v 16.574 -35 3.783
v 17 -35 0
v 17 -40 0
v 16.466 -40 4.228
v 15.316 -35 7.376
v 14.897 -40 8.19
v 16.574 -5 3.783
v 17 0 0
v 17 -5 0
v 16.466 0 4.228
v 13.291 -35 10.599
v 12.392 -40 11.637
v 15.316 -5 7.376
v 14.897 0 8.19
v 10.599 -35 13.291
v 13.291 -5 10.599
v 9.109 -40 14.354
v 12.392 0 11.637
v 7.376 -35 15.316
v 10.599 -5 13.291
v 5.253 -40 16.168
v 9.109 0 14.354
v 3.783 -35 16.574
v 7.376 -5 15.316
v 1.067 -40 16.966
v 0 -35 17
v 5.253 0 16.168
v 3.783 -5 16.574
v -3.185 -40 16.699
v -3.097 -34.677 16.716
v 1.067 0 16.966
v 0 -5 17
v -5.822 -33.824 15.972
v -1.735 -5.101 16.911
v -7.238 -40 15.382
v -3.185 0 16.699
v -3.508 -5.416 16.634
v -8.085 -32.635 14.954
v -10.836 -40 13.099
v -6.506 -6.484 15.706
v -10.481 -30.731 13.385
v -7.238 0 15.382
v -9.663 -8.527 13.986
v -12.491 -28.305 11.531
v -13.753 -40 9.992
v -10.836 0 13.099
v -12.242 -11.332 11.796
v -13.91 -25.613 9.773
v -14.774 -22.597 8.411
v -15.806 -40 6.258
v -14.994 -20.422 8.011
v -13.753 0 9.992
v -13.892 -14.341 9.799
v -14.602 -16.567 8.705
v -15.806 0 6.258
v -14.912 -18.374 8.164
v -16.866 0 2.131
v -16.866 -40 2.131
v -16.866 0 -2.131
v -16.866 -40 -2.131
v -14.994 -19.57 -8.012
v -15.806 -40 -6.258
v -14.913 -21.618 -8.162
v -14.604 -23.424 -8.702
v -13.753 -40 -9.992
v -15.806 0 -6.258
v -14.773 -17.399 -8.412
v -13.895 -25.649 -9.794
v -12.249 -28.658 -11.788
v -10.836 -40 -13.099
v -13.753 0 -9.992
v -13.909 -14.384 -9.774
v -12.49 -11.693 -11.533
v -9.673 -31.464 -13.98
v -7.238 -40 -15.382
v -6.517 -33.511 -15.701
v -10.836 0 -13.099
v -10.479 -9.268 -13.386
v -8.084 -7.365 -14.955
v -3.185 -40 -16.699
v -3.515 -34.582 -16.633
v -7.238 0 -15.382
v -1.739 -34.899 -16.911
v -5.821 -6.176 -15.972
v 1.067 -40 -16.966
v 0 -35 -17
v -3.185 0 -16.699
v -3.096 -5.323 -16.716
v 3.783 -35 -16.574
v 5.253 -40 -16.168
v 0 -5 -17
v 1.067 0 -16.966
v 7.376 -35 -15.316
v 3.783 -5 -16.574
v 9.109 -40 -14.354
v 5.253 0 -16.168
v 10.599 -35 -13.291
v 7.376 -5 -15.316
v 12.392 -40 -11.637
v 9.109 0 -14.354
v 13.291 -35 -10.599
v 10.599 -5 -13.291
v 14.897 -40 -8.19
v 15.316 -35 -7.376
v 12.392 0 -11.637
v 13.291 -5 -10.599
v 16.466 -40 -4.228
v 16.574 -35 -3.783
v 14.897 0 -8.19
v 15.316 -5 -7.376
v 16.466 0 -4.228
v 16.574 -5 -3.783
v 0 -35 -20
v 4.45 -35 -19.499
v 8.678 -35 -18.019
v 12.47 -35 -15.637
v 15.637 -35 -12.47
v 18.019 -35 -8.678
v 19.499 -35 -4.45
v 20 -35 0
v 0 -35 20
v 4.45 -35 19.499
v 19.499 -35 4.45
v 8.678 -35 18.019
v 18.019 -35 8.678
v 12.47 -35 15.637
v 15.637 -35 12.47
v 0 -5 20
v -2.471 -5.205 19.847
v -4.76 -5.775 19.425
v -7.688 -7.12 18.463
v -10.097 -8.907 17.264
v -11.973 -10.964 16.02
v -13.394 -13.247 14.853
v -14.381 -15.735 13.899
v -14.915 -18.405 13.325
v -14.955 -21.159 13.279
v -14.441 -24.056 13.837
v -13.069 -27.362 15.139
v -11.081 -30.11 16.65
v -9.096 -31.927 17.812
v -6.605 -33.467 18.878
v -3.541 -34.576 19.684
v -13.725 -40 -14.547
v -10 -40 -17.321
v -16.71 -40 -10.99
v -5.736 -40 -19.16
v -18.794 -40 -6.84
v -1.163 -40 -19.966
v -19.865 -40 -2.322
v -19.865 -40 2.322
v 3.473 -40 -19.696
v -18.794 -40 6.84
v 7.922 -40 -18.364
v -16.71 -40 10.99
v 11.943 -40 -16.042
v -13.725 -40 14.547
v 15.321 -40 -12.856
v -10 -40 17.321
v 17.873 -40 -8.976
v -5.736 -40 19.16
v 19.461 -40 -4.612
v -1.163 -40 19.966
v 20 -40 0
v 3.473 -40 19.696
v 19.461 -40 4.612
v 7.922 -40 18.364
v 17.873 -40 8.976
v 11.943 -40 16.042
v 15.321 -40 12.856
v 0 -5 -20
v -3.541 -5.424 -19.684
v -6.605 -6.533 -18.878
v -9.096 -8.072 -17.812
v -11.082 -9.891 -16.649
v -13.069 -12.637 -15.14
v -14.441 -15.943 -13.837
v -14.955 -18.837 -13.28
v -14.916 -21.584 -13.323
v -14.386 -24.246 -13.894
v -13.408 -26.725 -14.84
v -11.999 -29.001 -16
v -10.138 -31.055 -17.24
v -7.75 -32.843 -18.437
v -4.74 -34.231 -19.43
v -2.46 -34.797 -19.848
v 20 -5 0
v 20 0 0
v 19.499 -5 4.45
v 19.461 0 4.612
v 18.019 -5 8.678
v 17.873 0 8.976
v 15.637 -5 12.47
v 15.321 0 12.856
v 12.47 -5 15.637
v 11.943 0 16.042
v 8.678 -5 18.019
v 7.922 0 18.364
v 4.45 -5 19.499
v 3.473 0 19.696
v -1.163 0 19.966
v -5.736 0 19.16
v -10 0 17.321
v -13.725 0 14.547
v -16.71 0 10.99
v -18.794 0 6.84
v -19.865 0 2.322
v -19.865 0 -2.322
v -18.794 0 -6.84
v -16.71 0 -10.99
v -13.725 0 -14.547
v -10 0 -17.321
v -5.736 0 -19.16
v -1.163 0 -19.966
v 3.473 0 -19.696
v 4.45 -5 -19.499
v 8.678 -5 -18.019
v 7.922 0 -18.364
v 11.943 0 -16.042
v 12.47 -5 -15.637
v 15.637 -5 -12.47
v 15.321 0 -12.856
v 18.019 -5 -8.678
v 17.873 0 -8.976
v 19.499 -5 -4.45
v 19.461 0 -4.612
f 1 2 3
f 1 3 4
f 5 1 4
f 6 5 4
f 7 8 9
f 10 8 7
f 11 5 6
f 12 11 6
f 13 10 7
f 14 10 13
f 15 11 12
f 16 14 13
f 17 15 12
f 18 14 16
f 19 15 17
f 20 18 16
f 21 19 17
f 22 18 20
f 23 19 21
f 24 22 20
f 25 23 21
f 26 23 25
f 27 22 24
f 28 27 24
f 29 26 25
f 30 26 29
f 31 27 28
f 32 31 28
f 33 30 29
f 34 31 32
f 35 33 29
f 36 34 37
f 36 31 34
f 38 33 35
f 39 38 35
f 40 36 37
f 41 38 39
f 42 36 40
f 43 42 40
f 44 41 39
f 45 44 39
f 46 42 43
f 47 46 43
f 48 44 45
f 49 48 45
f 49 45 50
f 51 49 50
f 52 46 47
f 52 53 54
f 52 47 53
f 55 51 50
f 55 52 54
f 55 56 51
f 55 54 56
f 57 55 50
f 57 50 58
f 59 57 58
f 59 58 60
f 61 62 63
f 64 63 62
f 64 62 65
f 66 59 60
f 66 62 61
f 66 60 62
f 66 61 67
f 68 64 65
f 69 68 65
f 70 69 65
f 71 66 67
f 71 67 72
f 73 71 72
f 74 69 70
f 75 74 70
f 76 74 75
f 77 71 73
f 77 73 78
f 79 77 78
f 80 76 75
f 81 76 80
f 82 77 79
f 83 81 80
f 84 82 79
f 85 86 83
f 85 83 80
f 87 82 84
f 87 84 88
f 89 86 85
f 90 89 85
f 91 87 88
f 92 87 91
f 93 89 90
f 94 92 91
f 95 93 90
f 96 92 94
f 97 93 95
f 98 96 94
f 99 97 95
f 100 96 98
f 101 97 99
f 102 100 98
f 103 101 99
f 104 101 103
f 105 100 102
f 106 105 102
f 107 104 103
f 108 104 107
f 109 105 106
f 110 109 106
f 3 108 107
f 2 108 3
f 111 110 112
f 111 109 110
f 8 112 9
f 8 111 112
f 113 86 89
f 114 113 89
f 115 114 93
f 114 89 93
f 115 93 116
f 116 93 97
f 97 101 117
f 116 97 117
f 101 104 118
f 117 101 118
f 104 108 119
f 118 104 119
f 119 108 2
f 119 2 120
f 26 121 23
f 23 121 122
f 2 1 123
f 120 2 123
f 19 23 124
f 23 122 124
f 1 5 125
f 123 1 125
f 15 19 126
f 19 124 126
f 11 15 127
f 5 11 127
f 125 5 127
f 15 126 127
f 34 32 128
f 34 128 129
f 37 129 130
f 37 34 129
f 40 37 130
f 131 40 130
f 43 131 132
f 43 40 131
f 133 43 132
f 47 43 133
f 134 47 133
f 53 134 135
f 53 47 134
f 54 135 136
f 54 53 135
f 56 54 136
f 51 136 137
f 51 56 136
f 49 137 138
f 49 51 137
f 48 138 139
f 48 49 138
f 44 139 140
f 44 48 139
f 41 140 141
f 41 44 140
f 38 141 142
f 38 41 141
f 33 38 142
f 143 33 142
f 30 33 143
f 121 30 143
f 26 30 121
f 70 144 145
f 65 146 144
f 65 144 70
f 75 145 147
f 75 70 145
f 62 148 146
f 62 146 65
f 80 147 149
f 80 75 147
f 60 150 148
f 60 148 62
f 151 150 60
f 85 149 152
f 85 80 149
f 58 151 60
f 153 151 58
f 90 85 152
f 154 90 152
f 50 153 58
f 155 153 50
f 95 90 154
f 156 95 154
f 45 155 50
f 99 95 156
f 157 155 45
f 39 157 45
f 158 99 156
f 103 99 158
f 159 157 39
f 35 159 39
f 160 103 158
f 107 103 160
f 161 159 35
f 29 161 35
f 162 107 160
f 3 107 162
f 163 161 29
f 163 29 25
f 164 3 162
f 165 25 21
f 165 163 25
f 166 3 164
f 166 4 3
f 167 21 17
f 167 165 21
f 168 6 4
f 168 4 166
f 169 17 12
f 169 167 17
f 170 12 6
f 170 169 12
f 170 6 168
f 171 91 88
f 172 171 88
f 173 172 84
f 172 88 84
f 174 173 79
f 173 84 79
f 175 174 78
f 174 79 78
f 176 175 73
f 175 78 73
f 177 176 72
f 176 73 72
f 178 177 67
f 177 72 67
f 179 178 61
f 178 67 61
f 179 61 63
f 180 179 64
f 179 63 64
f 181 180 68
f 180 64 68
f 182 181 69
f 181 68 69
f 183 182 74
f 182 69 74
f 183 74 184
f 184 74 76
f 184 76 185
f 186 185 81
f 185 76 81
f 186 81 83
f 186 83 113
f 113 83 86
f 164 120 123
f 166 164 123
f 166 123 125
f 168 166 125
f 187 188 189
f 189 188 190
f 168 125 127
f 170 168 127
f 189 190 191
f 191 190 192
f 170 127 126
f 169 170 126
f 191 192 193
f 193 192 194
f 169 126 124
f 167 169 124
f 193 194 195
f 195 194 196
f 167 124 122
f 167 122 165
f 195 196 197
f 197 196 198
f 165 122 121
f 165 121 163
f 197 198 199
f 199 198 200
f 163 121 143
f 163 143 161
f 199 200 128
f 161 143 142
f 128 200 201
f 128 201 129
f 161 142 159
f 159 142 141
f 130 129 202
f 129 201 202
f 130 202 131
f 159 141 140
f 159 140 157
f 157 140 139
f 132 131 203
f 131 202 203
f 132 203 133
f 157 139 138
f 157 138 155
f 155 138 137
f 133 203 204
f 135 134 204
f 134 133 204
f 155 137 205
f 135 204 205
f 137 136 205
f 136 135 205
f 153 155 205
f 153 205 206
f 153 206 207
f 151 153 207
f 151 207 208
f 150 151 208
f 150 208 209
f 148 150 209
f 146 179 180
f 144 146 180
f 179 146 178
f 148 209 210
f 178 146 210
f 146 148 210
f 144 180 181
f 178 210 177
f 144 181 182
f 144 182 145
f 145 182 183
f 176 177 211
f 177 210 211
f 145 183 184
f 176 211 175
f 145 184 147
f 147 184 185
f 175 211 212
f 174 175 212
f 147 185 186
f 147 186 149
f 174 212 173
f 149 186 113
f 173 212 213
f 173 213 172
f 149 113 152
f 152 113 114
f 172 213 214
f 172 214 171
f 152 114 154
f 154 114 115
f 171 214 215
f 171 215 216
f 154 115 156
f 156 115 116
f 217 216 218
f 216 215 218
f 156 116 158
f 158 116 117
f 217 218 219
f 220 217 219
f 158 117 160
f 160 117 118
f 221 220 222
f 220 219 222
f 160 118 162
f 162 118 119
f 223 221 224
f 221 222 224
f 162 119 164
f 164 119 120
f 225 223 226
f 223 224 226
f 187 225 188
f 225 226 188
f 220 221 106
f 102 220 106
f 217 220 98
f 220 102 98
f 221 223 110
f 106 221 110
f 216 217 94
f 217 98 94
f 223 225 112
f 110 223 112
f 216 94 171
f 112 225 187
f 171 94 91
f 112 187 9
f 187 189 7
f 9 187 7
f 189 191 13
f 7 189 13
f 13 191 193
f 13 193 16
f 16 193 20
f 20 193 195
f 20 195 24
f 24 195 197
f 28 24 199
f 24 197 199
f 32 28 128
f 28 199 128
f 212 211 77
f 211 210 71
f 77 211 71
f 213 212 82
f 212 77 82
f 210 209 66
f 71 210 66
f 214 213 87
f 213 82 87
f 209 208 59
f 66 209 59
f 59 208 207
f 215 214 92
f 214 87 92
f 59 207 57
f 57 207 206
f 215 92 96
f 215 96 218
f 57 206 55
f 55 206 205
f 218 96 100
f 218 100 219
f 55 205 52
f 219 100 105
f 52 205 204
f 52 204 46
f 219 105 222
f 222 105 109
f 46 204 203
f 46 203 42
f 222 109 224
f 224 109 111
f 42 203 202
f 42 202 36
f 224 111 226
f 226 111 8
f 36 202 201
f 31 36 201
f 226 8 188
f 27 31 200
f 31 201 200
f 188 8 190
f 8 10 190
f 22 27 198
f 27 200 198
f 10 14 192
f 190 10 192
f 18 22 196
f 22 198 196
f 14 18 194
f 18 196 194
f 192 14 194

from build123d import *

# Parameters (mm, degrees)
F0_R     = 20
F0_R_2   = 17
F1_DEPTH = 40
F3_DEPTH = 25
F4_DEPTH = 25


with BuildPart() as f1:
    # F0 (on Front) → F1 (new body)
    with BuildSketch(Plane.XZ):
        Circle(F0_R)
        Circle(F0_R_2, mode=Mode.SUBTRACT)
    extrude(amount=F1_DEPTH)

    # F2 (on Top) → F3 (cut)
    with BuildSketch(Plane.XY):
        with BuildLine():
            Line((20, -5), (0, -5))
            ThreePointArc((0, -5), (-15, -20), (0, -35))
            Line((0, -35), (20, -35))
            ThreePointArc((20, -35), (35, -20), (20, -5))
        make_face()
    extrude(amount=F3_DEPTH, mode=Mode.SUBTRACT)

    # F2 (on Top) → F4 (cut)
    with BuildSketch(Plane.XY):
        with BuildLine():
            Line((20, -5), (0, -5))
            ThreePointArc((0, -5), (-15, -20), (0, -35))
            Line((0, -35), (20, -35))
            ThreePointArc((20, -35), (35, -20), (20, -5))
        make_face()
    extrude(amount=-F4_DEPTH, mode=Mode.SUBTRACT)


solid = f1.part
